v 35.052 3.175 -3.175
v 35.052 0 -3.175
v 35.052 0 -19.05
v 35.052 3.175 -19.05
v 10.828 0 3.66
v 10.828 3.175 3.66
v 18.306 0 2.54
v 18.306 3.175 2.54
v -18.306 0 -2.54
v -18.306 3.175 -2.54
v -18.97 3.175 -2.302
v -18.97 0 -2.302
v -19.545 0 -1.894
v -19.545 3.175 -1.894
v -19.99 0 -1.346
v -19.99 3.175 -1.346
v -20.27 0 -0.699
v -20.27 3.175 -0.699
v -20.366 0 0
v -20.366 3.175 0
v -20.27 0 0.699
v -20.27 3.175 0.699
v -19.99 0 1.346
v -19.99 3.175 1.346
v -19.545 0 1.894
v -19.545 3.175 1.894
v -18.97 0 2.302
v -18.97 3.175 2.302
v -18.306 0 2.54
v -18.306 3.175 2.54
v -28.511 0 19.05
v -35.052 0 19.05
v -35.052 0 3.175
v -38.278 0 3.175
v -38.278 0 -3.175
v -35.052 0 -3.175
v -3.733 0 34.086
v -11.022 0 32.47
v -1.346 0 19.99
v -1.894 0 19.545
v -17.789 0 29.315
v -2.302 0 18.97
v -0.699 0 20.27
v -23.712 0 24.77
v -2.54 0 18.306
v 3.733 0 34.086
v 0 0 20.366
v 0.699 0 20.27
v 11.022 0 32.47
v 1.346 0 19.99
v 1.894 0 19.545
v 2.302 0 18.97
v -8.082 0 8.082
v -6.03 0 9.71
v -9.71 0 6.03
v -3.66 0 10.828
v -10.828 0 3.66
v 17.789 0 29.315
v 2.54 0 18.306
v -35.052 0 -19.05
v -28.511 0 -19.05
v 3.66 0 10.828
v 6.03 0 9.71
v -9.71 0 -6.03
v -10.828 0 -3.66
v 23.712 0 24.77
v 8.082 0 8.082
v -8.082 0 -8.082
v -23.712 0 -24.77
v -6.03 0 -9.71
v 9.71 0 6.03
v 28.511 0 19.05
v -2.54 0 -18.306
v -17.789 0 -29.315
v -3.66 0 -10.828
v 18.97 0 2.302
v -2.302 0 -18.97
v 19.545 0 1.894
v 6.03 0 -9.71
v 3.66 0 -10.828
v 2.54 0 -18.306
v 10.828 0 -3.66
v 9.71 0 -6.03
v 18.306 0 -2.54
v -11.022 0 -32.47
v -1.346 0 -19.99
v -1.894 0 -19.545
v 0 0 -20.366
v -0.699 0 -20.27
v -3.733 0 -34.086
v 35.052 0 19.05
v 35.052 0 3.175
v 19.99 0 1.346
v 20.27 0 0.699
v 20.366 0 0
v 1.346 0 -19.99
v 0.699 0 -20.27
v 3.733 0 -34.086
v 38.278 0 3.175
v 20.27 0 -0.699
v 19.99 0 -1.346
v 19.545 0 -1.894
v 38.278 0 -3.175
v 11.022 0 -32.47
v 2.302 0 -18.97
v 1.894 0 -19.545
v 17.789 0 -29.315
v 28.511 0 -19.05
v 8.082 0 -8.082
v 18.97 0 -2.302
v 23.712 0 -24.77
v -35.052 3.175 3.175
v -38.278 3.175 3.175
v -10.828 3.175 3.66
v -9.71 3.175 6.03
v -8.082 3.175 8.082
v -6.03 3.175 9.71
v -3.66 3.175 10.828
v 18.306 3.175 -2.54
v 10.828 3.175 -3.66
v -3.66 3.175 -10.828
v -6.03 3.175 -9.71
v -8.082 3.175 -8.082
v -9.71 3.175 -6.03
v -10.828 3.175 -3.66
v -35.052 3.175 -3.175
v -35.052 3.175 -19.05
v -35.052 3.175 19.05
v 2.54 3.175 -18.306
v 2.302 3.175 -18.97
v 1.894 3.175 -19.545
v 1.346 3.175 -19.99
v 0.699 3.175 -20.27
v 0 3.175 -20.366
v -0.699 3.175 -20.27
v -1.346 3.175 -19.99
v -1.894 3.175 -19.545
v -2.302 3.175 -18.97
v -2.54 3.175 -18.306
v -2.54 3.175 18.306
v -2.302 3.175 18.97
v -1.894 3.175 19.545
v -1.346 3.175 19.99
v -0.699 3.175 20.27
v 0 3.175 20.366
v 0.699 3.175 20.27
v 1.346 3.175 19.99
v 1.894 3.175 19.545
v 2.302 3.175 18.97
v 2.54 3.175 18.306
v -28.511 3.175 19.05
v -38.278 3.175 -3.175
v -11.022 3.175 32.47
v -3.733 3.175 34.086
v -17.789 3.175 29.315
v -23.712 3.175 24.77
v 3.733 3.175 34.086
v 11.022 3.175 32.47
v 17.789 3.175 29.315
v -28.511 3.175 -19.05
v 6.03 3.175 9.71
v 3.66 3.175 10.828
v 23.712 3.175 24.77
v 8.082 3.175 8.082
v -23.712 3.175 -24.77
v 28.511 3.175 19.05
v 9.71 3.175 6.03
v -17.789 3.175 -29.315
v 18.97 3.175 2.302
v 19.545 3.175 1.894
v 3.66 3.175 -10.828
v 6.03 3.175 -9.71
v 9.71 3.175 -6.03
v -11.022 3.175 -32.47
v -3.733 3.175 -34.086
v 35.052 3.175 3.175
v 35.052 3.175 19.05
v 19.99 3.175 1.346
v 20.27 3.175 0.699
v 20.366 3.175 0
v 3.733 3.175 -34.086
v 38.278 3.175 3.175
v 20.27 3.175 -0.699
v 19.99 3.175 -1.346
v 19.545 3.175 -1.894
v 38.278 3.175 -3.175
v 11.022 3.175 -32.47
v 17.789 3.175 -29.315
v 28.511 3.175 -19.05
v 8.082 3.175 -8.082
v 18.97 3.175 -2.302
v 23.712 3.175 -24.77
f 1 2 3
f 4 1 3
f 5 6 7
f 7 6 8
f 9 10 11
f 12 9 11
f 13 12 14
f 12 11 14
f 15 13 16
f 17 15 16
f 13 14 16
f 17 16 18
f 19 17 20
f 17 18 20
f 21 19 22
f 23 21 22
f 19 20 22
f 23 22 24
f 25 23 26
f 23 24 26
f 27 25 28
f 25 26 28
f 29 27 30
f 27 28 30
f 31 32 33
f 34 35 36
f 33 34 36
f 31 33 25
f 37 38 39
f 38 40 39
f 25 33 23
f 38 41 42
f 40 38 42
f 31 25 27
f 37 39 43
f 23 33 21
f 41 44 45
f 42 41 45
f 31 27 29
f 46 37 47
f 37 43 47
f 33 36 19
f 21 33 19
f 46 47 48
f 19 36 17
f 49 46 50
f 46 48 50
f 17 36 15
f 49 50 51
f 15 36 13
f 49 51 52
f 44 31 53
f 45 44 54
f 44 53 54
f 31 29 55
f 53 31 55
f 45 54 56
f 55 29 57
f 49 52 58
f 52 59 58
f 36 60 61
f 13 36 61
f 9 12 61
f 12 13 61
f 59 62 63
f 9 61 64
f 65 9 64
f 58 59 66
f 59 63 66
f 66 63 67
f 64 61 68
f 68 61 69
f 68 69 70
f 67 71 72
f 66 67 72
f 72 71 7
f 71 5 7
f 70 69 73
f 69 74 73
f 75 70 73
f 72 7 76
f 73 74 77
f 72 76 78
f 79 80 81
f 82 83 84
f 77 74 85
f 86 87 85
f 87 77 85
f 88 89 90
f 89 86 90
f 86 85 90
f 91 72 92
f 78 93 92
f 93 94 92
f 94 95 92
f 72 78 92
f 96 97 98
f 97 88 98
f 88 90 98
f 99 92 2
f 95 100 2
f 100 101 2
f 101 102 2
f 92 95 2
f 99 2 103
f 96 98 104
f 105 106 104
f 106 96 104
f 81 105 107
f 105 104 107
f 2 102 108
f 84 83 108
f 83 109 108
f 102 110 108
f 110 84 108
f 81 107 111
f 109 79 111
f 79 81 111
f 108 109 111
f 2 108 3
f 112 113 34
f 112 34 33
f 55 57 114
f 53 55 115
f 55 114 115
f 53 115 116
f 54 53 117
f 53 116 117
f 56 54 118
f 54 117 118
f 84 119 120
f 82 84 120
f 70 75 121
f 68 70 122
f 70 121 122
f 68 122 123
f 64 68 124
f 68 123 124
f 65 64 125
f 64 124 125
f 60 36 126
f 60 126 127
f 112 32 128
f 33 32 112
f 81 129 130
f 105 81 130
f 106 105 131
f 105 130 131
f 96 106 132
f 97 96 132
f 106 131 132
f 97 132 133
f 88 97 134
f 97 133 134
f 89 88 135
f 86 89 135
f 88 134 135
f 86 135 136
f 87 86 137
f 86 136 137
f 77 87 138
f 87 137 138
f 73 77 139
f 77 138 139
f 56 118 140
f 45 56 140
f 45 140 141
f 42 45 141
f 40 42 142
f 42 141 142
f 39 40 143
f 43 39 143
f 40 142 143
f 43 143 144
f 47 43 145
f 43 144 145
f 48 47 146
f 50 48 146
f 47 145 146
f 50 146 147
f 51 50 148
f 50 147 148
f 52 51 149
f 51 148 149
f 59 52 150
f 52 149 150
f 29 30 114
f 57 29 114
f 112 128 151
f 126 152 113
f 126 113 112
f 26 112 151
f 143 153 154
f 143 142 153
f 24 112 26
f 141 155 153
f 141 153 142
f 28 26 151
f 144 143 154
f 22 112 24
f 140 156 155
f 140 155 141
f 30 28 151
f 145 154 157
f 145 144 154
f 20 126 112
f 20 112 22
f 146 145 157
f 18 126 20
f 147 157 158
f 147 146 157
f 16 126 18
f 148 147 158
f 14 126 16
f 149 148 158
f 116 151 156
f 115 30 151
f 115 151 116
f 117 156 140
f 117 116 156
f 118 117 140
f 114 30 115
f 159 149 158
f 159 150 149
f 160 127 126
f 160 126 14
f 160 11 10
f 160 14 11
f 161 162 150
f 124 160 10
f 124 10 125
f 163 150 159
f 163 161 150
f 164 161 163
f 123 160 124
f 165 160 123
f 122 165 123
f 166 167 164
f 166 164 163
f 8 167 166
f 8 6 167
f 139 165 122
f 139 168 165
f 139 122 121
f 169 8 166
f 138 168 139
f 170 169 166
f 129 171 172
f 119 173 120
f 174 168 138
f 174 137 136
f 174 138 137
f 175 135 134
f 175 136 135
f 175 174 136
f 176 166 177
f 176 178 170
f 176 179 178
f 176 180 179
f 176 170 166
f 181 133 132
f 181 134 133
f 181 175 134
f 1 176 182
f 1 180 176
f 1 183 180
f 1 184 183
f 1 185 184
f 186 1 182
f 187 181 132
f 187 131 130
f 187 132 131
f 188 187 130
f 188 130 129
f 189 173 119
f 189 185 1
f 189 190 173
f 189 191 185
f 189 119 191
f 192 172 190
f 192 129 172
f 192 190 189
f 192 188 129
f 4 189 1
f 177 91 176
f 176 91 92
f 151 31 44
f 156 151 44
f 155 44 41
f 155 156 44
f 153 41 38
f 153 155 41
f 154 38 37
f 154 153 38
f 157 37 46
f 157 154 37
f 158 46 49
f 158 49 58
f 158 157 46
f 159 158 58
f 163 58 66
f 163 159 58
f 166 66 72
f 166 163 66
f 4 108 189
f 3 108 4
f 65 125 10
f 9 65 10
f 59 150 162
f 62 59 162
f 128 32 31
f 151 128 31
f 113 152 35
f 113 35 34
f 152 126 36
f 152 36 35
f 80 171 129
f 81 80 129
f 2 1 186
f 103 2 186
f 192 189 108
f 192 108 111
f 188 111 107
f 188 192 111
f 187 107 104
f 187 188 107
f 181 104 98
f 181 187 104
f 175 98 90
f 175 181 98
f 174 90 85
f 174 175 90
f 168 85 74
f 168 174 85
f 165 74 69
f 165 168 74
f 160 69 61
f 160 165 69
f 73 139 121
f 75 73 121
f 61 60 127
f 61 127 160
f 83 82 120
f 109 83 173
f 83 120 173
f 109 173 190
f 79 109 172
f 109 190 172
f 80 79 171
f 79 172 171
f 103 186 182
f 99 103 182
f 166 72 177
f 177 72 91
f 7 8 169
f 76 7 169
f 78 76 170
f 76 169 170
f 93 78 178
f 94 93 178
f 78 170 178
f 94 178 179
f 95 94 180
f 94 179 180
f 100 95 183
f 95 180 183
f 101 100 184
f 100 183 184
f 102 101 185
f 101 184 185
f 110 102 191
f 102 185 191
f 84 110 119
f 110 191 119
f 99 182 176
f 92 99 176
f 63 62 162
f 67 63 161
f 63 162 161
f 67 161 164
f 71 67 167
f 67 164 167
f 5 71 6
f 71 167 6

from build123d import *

# Parameters (mm, degrees)
SKETCH1_W                                = 70.104
SKETCH1_H                                = 38.1
RECTANGULAR_BASE_DEPTH                   = 3.175
SKETCH2_R                                = 34.29
CIRCULAR_BASE_ADD_ON_DEPTH               = 3.175
HOLE_FOR_SERVO_ARM_DEPTH                 = 4.175
TAB_DEPTH                                = 3.175
CIRCULAR_PATTERN_OF_SERVO_ARM_HOLE_COUNT = 4
SKETCH6_R                                = 11.43
CUT_EXTRUDE2_DEPTH                       = 4.175


with BuildPart() as part:
    # Sketch1 → rectangular base (new body)
    with BuildSketch(Plane(origin=(0, 0, 0), x_dir=(1, 0, 0), z_dir=(0, 1, 0))):
        Rectangle(SKETCH1_W, SKETCH1_H)
    extrude(amount=RECTANGULAR_BASE_DEPTH)

    # Sketch2 → circular base add on (add)
    with BuildSketch(Plane(origin=(0, 3.175, 0), x_dir=(1, 0, 0), z_dir=(0, 1, 0))):
        Circle(SKETCH2_R)
    extrude(amount=-CIRCULAR_BASE_ADD_ON_DEPTH)

    # Sketch3 → hole for servo arm (cut, through all)
    with BuildSketch(Plane(origin=(0, 3.175, 0), x_dir=(1, 0, 0), z_dir=(0, 1, 0))):
        with BuildLine():
            Line((-2.54, 18.306077), (-4.445, 5.588))
            Line((-4.445, 5.588), (-5.881840979, 4.151159021))
            Line((-5.881840979, 4.151159021), (0, 0))
            Line((0, 0), (5.881840979, 4.151159021))
            Line((5.881840979, 4.151159021), (4.445, 5.588))
            Line((4.445, 5.588), (2.54, 18.306077))
            ThreePointArc((2.54, 18.306077), (0, 20.366046175), (-2.54, 18.306077))
        make_face()
    hole_for_servo_arm = extrude(amount=-HOLE_FOR_SERVO_ARM_DEPTH, mode=Mode.SUBTRACT)

    # Sketch4 → tab (add)
    with BuildSketch(Plane(origin=(0, 3.175, 0), x_dir=(1, 0, 0), z_dir=(0, 1, 0))):
        Polygon((-35.052, 0), (-35.052, 3.175), (-38.2778, 3.175), (-38.2778, -3.175), (-35.052, -3.175), align=None)
    tab = extrude(amount=-TAB_DEPTH)

    # Mirror1: tab across plane
    add(tab.mirror(Plane(origin=(0, 0, 0), x_dir=(0, 0, 1), z_dir=(1, 0, 0))))

    # Circular pattern of servo arm hole: hole for servo arm ×4 about axis
    circular_pattern_of_servo_arm_hole_axis = Axis((0, 0, 0), (0, 1, 0))
    for i in range(1, CIRCULAR_PATTERN_OF_SERVO_ARM_HOLE_COUNT):
        add(hole_for_servo_arm.rotate(circular_pattern_of_servo_arm_hole_axis, i * 360 / CIRCULAR_PATTERN_OF_SERVO_ARM_HOLE_COUNT), mode=Mode.SUBTRACT)

    # Sketch6 → Cut-Extrude2 (cut, through all)
    with BuildSketch(Plane(origin=(0, 3.175, 0), x_dir=(1, 0, 0), z_dir=(0, 1, 0))):
        Circle(SKETCH6_R)
    extrude(amount=-CUT_EXTRUDE2_DEPTH, mode=Mode.SUBTRACT)


solid = part.part
